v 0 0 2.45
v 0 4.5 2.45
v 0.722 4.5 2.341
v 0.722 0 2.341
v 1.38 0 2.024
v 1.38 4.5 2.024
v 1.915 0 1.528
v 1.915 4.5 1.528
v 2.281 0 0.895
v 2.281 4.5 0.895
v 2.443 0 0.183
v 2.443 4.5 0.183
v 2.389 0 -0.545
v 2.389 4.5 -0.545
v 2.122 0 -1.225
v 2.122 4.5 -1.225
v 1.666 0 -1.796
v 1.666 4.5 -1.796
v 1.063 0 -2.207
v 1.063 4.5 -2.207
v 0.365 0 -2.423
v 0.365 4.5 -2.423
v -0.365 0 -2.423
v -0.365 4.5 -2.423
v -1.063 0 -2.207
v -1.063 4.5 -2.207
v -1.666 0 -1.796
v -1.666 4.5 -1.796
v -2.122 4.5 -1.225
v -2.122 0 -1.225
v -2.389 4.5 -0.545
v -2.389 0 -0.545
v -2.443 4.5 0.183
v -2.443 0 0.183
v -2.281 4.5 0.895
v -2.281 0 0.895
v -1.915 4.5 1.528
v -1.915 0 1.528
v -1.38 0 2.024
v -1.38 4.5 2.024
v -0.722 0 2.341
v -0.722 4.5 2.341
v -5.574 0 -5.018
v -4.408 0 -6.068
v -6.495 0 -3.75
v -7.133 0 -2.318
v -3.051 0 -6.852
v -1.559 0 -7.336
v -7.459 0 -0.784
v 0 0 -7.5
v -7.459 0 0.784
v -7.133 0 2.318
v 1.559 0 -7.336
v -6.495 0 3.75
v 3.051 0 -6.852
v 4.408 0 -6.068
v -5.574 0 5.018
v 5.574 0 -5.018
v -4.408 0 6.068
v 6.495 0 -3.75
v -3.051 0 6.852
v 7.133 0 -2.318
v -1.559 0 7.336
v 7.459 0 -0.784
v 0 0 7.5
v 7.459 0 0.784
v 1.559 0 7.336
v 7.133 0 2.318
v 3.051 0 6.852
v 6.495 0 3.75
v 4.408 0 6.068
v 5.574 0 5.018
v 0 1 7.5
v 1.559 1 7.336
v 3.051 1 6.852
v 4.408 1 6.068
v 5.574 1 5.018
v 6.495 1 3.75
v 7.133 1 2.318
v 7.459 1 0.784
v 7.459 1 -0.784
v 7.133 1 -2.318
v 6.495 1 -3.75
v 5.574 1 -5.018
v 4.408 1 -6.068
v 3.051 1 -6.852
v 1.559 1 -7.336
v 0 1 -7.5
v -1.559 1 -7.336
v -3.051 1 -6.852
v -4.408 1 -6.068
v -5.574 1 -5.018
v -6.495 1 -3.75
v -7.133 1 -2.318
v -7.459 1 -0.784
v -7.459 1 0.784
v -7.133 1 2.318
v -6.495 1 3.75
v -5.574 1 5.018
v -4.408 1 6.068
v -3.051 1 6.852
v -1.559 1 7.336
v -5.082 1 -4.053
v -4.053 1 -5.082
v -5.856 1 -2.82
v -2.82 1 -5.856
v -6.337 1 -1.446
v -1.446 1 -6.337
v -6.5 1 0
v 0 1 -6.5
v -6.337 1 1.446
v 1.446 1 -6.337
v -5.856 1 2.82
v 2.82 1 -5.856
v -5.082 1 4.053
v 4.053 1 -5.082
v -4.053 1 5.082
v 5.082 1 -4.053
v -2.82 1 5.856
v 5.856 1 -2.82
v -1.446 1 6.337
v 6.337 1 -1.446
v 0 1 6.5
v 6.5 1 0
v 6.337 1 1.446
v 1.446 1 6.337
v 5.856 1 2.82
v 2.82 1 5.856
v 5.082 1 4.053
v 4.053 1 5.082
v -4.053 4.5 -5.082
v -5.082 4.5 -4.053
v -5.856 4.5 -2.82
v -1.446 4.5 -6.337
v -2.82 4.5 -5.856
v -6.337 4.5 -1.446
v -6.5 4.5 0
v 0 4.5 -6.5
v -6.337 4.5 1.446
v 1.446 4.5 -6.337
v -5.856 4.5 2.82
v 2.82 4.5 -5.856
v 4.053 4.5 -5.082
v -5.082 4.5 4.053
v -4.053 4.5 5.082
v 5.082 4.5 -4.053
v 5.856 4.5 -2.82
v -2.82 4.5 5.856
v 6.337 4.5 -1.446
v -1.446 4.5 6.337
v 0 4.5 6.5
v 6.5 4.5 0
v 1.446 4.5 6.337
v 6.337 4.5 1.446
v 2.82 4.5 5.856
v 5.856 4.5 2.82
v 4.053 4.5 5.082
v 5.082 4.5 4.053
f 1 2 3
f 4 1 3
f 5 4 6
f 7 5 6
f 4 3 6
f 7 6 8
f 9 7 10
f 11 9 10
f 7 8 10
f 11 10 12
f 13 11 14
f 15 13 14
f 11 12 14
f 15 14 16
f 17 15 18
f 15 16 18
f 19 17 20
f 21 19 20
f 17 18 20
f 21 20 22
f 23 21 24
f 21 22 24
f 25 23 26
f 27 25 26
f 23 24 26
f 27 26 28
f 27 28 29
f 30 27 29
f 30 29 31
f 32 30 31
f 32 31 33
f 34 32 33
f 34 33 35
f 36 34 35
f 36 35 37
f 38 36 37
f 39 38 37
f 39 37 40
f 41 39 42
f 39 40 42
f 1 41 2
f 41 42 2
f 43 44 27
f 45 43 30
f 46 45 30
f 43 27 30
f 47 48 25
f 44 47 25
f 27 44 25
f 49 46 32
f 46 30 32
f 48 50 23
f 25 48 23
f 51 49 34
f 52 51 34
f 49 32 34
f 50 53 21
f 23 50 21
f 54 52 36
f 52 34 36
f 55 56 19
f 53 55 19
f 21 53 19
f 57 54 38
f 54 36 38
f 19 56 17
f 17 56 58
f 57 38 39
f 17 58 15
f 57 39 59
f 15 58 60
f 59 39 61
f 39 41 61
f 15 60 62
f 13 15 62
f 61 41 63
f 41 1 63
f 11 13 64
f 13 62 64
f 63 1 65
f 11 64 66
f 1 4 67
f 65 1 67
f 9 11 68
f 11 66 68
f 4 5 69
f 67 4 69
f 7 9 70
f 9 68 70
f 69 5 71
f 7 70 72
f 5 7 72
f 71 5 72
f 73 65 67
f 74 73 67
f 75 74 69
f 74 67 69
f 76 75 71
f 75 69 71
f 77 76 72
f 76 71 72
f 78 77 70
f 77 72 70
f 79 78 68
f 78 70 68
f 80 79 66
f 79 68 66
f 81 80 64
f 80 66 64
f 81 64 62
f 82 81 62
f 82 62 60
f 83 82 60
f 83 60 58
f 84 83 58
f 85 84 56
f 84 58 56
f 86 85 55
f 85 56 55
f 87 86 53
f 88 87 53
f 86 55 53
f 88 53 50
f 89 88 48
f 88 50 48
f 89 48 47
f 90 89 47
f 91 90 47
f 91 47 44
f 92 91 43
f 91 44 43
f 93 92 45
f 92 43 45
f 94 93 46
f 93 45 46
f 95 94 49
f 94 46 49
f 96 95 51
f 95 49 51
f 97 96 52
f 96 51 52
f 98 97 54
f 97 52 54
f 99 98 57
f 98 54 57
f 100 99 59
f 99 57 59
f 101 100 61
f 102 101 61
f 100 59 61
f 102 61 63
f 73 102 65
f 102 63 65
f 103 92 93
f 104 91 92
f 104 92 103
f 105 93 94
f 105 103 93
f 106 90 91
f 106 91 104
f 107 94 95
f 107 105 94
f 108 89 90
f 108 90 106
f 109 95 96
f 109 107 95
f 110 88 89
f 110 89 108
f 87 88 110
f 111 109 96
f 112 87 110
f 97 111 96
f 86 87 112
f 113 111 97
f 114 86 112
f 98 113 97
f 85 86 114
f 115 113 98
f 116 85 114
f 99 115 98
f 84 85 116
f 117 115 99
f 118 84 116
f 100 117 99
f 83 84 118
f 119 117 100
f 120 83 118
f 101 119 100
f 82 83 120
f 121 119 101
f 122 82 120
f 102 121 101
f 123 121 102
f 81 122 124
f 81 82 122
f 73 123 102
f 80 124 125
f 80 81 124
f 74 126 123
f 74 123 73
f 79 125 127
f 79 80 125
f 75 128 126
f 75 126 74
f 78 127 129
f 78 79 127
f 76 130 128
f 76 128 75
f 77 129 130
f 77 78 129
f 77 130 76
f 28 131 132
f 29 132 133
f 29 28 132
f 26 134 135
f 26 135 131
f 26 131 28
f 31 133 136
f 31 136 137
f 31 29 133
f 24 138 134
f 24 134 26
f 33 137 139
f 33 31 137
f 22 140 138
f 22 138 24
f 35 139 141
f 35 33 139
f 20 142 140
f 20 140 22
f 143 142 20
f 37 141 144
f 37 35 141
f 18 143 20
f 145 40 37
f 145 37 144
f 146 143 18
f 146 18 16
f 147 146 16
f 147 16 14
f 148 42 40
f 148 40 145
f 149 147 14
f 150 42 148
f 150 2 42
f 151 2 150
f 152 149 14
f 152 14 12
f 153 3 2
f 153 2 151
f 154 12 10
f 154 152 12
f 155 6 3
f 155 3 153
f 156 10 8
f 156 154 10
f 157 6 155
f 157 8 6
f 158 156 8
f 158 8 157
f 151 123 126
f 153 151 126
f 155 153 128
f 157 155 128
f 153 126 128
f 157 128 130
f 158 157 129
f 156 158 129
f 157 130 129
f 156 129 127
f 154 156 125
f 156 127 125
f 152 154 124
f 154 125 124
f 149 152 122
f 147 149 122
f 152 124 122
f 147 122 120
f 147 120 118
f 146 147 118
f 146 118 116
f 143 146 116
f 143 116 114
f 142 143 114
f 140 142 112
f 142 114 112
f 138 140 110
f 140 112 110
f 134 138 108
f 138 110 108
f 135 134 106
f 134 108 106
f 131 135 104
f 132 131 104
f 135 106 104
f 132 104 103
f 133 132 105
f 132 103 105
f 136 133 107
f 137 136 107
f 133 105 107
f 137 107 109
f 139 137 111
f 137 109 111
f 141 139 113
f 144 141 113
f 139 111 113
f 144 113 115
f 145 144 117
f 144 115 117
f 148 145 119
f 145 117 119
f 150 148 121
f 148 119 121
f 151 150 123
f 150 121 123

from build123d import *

# Parameters (mm, degrees)
SKETCH1_R           = 7.5
BOSS_EXTRUDE1_DEPTH = 1
SKETCH2_R           = 6.5
BOSS_EXTRUDE2_DEPTH = 3.5
SKETCH3_R           = 2.45
CUT_EXTRUDE1_DEPTH  = 4.5


with BuildPart() as part:
    # Sketch1 → Boss-Extrude1 (new body)
    with BuildSketch(Plane(origin=(0, 0, 0), x_dir=(1, 0, 0), z_dir=(0, 1, 0))):
        with Locations(Location((0, 0, 0), (0, 0, 270))):
            Circle(SKETCH1_R)
    extrude(amount=BOSS_EXTRUDE1_DEPTH)

    # Sketch2 → Boss-Extrude2 (add)
    with BuildSketch(Plane(origin=(0, 1, 0), x_dir=(1, 0, 0), z_dir=(0, 1, 0))):
        with Locations(Location((0, 0, 0), (0, 0, 270))):
            Circle(SKETCH2_R)
    extrude(amount=BOSS_EXTRUDE2_DEPTH)

    # Sketch3 → Cut-Extrude1 (cut)
    with BuildSketch(Plane(origin=(0, 4.5, 0), x_dir=(1, 0, 0), z_dir=(0, 1, 0))):
        with Locations(Location((0, 0, 0), (0, 0, 270))):
            Circle(SKETCH3_R)
    extrude(amount=-CUT_EXTRUDE1_DEPTH, mode=Mode.SUBTRACT)


solid = part.part
